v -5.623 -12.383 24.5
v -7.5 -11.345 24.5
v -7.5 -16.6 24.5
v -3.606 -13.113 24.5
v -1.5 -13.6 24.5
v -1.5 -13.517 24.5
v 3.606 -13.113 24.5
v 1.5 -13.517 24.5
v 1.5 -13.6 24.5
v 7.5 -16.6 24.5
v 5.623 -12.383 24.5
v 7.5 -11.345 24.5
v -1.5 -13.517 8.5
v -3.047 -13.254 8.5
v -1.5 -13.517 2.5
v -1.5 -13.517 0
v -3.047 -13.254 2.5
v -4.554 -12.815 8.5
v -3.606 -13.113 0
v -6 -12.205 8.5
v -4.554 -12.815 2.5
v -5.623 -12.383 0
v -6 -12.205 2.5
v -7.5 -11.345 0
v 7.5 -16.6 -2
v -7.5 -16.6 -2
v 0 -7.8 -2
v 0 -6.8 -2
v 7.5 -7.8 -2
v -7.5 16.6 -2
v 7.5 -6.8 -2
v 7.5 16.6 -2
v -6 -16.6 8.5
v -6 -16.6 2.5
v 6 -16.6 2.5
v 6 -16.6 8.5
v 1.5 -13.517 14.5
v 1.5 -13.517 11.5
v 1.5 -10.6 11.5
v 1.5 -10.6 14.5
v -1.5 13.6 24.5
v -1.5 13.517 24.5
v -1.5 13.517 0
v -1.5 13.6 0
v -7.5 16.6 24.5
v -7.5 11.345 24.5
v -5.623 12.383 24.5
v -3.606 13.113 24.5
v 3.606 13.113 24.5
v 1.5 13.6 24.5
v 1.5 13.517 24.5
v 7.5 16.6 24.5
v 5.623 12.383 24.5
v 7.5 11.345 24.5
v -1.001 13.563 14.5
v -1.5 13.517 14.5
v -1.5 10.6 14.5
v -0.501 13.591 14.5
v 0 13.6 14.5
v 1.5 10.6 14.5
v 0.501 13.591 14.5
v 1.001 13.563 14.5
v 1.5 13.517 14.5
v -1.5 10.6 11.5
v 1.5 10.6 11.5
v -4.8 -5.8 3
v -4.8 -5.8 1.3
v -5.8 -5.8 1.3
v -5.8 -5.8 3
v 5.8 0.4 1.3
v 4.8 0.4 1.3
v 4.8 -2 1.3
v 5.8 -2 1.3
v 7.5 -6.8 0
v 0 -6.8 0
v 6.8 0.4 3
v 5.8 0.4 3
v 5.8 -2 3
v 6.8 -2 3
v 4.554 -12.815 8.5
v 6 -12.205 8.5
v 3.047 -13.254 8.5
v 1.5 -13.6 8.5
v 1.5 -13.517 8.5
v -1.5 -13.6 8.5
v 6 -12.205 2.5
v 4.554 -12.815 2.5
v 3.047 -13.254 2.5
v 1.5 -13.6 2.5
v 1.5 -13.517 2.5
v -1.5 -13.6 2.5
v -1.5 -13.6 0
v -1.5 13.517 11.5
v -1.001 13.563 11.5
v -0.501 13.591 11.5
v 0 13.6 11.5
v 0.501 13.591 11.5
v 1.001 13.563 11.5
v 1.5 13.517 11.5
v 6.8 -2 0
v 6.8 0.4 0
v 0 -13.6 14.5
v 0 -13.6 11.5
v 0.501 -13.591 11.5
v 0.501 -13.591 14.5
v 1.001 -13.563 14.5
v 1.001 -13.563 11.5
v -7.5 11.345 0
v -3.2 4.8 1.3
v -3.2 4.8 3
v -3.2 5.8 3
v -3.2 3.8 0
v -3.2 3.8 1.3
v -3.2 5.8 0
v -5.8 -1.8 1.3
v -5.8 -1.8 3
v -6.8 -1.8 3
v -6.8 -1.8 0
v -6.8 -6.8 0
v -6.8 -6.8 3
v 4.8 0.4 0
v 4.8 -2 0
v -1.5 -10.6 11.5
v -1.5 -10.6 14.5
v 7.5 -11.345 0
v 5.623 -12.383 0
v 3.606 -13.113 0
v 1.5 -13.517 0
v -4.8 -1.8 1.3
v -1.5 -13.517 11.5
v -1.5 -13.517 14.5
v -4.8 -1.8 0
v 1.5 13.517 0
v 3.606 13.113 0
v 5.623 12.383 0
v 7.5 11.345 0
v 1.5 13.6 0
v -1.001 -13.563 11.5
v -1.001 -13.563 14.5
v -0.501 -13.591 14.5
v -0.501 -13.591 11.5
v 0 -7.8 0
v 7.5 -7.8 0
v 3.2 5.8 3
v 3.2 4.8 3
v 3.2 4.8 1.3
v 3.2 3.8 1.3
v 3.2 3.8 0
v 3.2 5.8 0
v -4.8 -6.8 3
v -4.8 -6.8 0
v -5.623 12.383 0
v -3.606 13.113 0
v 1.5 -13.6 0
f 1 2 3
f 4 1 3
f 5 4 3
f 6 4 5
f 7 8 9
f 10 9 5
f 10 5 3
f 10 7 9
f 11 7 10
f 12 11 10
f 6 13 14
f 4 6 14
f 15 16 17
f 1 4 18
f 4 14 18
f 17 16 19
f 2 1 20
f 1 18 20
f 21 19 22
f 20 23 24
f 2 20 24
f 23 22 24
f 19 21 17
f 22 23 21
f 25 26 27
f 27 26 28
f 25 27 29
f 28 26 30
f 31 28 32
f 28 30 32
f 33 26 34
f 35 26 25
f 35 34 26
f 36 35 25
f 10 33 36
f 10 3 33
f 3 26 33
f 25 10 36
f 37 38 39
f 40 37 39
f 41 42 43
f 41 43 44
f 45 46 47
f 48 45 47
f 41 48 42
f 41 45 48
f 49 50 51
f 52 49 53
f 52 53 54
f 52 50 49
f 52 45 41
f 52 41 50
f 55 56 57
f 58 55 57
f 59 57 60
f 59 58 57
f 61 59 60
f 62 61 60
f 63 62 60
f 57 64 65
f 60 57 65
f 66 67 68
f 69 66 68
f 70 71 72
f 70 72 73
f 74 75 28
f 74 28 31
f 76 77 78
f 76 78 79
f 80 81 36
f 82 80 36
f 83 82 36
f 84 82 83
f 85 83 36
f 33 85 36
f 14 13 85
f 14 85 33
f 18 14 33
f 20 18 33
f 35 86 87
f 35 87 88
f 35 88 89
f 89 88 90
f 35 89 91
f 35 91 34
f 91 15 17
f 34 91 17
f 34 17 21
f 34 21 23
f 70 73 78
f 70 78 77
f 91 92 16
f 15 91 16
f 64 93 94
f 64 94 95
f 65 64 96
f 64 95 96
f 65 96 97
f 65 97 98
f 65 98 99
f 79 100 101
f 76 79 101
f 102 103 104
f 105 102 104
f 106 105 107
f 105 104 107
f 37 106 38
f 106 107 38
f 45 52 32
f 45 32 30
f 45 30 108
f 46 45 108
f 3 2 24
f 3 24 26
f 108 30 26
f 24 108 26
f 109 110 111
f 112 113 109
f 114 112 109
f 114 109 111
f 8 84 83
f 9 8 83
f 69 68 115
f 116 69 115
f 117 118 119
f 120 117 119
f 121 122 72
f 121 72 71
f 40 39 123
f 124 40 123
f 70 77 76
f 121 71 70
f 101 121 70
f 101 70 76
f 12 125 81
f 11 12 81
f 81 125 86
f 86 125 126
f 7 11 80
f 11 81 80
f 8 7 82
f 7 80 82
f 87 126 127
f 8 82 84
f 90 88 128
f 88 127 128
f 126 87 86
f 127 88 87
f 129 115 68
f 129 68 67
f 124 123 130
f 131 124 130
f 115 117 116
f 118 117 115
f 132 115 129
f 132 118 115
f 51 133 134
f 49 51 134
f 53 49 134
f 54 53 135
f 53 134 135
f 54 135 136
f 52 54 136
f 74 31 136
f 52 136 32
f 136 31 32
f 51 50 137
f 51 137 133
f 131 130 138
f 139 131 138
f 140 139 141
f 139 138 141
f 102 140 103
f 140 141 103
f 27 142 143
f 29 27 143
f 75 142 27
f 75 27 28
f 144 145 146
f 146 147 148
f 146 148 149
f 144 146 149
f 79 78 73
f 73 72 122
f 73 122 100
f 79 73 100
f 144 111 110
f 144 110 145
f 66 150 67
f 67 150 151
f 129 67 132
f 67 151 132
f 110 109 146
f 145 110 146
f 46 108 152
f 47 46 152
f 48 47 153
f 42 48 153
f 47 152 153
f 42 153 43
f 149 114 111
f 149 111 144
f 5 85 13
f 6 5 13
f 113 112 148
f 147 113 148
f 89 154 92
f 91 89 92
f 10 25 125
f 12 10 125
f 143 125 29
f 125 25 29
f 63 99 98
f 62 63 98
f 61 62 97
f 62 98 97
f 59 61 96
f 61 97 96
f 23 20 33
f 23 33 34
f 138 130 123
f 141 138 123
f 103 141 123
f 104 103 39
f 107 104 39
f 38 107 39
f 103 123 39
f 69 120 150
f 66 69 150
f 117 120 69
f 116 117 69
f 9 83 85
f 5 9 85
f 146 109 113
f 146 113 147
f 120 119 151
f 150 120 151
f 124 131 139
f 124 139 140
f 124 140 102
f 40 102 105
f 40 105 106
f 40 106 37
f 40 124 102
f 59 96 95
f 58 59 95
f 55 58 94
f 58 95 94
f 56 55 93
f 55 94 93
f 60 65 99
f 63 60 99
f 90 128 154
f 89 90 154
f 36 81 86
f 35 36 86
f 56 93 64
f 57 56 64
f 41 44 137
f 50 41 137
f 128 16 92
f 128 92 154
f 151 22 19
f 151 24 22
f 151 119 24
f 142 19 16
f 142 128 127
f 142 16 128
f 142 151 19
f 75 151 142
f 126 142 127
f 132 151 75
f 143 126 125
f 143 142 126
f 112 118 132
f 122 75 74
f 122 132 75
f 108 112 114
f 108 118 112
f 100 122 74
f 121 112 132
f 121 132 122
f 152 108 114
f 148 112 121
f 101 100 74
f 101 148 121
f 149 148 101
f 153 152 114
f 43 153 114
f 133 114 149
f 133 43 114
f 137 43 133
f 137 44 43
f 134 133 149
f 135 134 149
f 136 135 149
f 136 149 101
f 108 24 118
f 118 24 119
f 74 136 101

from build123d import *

# Parameters (mm, degrees)
BOSS_EXTRUDE1_DEPTH   = 14.5
BOSS_EXTRUDE1_2_DEPTH = 14.5
BOSS_EXTRUDE1_3_DEPTH = 14.5
BOSS_EXTRUDE1_4_DEPTH = 14.5
SKETCH1_3_W           = 15
SKETCH1_3_H           = 33.2
BOSS_EXTRUDE3_DEPTH   = 2
CUT_EXTRUDE1_DEPTH    = 11.5
BOSS_EXTRUDE4_DEPTH   = 24.5
SKETCH2_W             = 1
SKETCH2_H             = 4
SKETCH2_W_2           = 6.4
SKETCH2_H_2           = 1
SKETCH2_H_3           = 2.4
BOSS_EXTRUDE5_DEPTH   = 1.3
SKETCH2_3_W           = 6.4
SKETCH2_3_H           = 1
SKETCH2_3_W_2         = 1
SKETCH2_3_H_2         = 2.4
BOSS_EXTRUDE6_DEPTH   = 3
SKETCH2_4_W           = 7.5
SKETCH2_4_H           = 1
CUT_EXTRUDE2_DEPTH    = 3
SKETCH3_W             = 12
SKETCH3_H             = 6
CUT_EXTRUDE4_DEPTH    = 5.254957


with BuildPart() as part:
    # Sketch1 → Boss-Extrude1 (new body)
    with BuildSketch(Plane.XY):
        with BuildLine():
            Line((7.5, 16.6), (-7.5, 16.6))
            Line((-7.5, 16.6), (-7.5, 11.34504297))
            ThreePointArc((-7.5, 11.34504297), (-4.629187607, 12.787909215), (-1.5, 13.5170263))
            Line((-1.5, 13.5170263), (-1.5, 13.6))
            Line((-1.5, 13.6), (0, 13.6))
            Line((0, 13.6), (1.5, 13.6))
            Line((1.5, 13.6), (1.5, 13.5170263))
            ThreePointArc((1.5, 13.5170263), (4.629187607, 12.787909215), (7.5, 11.34504297))
            Line((7.5, 11.34504297), (7.5, 16.6))
        make_face()
    extrude(amount=BOSS_EXTRUDE1_DEPTH)



with BuildPart() as body_2:
    # Sketch1 → Boss-Extrude1 2 (new body)
    with BuildSketch(Plane.XY):
        with BuildLine():
            ThreePointArc((0, 13.6), (-0.751146563, 13.579240731), (-1.5, 13.5170263))
            Line((-1.5, 13.5170263), (-1.5, 10.6))
            Line((-1.5, 10.6), (1.5, 10.6))
            Line((1.5, 10.6), (1.5, 13.5170263))
            ThreePointArc((1.5, 13.5170263), (0.751146563, 13.579240731), (0, 13.6))
        make_face()
    extrude(amount=BOSS_EXTRUDE1_2_DEPTH)


with BuildPart() as body_3:
    # Sketch1 → Boss-Extrude1 3 (new body)
    with BuildSketch(Plane.XY):
        with BuildLine():
            Line((-1.5, -10.6), (-1.5, -13.5170263))
            ThreePointArc((-1.5, -13.5170263), (-0.751146563, -13.579240731), (0, -13.6))
            ThreePointArc((0, -13.6), (0.751146563, -13.579240731), (1.5, -13.5170263))
            Line((1.5, -13.5170263), (1.5, -10.6))
            Line((1.5, -10.6), (-1.5, -10.6))
        make_face()
    extrude(amount=BOSS_EXTRUDE1_3_DEPTH)


with BuildPart() as body_4:
    # Sketch1 → Boss-Extrude1 4 (new body)
    with BuildSketch(Plane.XY):
        with BuildLine():
            ThreePointArc((-1.5, -13.5170263), (-4.629187607, -12.787909215), (-7.5, -11.34504297))
            Line((-7.5, -11.34504297), (-7.5, -16.6))
            Line((-7.5, -16.6), (7.5, -16.6))
            Line((7.5, -16.6), (7.5, -11.34504297))
            ThreePointArc((7.5, -11.34504297), (4.629187607, -12.787909215), (1.5, -13.5170263))
            Line((1.5, -13.5170263), (1.5, -13.6))
            Line((1.5, -13.6), (0, -13.6))
            Line((0, -13.6), (-1.5, -13.6))
            Line((-1.5, -13.6), (-1.5, -13.5170263))
        make_face()
    extrude(amount=BOSS_EXTRUDE1_4_DEPTH)


with BuildPart() as part_1:
    add(part.part)

    add(body_4.part)  # Boss-Extrude3 merges body 4
    # Sketch1<3> → Boss-Extrude3 (add)
    with BuildSketch(Plane.XY):
        Rectangle(SKETCH1_3_W, SKETCH1_3_H)
    extrude(amount=-BOSS_EXTRUDE3_DEPTH)

    # Sketch1<5> → Boss-Extrude4 (add)
    with BuildSketch(Plane.XY):
        with BuildLine():
            Line((7.5, 16.6), (-7.5, 16.6))
            Line((-7.5, 16.6), (-7.5, 11.34504297))
            ThreePointArc((-7.5, 11.34504297), (-4.629187607, 12.787909215), (-1.5, 13.5170263))
            Line((-1.5, 13.5170263), (-1.5, 13.6))
            Line((-1.5, 13.6), (0, 13.6))
            Line((0, 13.6), (1.5, 13.6))
            Line((1.5, 13.6), (1.5, 13.5170263))
            ThreePointArc((1.5, 13.5170263), (4.629187607, 12.787909215), (7.5, 11.34504297))
            Line((7.5, 11.34504297), (7.5, 16.6))
        make_face()
        with BuildLine():
            ThreePointArc((-1.5, -13.5170263), (-4.629187607, -12.787909215), (-7.5, -11.34504297))
            Line((-7.5, -11.34504297), (-7.5, -16.6))
            Line((-7.5, -16.6), (7.5, -16.6))
            Line((7.5, -16.6), (7.5, -11.34504297))
            ThreePointArc((7.5, -11.34504297), (4.629187607, -12.787909215), (1.5, -13.5170263))
            Line((1.5, -13.5170263), (1.5, -13.6))
            Line((1.5, -13.6), (0, -13.6))
            Line((0, -13.6), (-1.5, -13.6))
            Line((-1.5, -13.6), (-1.5, -13.5170263))
        make_face()
    extrude(amount=BOSS_EXTRUDE4_DEPTH)

    # Sketch2 → Boss-Extrude5 (add)
    with BuildSketch(Plane.XY):
        with Locations((-5.3, -3.8)):
            Rectangle(SKETCH2_W, SKETCH2_H)
        with Locations((0, 4.3)):
            Rectangle(SKETCH2_W_2, SKETCH2_H_2)
        with Locations((5.3, -0.8)):
            Rectangle(SKETCH2_W, SKETCH2_H_3)
    extrude(amount=BOSS_EXTRUDE5_DEPTH)

    # Sketch2<3> → Boss-Extrude6 (add)
    with BuildSketch(Plane.XY):
        with Locations((0, 5.3)):
            Rectangle(SKETCH2_3_W, SKETCH2_3_H)
        Polygon((-5.8, -1.8), (-6.8, -1.8), (-6.8, -6.8), (-4.8, -6.8), (-4.8, -5.8), (-5.8, -5.8), align=None)
        with Locations((6.3, -0.8)):
            Rectangle(SKETCH2_3_W_2, SKETCH2_3_H_2)
    extrude(amount=BOSS_EXTRUDE6_DEPTH)

    # Sketch2<4> → Cut-Extrude2 (cut, through all)
    with BuildSketch(Plane.XY):
        with Locations((3.75, -7.3)):
            Rectangle(SKETCH2_4_W, SKETCH2_4_H)
    extrude(amount=-CUT_EXTRUDE2_DEPTH, mode=Mode.SUBTRACT)

    # Sketch3 → Cut-Extrude4 (cut)
    with BuildSketch(Plane(origin=(0, -11.34504297, 0), x_dir=(-1, 0, 0), z_dir=(0, -1, 0))):
        with Locations((0, -5.5)):
            Rectangle(SKETCH3_W, SKETCH3_H)
    extrude(amount=CUT_EXTRUDE4_DEPTH, mode=Mode.SUBTRACT)


with BuildPart() as cut_extrude1_tool:
    # Sketch1<4> → Cut-Extrude1 (new body)
    with BuildSketch(Plane.XY):
        with BuildLine():
            Line((-1.5, -10.6), (-1.5, -13.5170263))
            ThreePointArc((-1.5, -13.5170263), (-0.751146563, -13.579240731), (0, -13.6))
            ThreePointArc((0, -13.6), (0.751146563, -13.579240731), (1.5, -13.5170263))
            Line((1.5, -13.5170263), (1.5, -10.6))
            Line((1.5, -10.6), (-1.5, -10.6))
        make_face()
        with BuildLine():
            ThreePointArc((0, 13.6), (-0.751146563, 13.579240731), (-1.5, 13.5170263))
            Line((-1.5, 13.5170263), (-1.5, 10.6))
            Line((-1.5, 10.6), (1.5, 10.6))
            Line((1.5, 10.6), (1.5, 13.5170263))
            ThreePointArc((1.5, 13.5170263), (0.751146563, 13.579240731), (0, 13.6))
        make_face()
    extrude(amount=CUT_EXTRUDE1_DEPTH)


with BuildPart() as body_2_1:
    add(body_2.part)

    # Cut-Extrude1: cut by cut_extrude1_tool
    add(cut_extrude1_tool.part, mode=Mode.SUBTRACT)


with BuildPart() as body_3_1:
    add(body_3.part)

    # Cut-Extrude1: cut by cut_extrude1_tool
    add(cut_extrude1_tool.part, mode=Mode.SUBTRACT)


solid = Compound([part_1.part, body_2_1.part, body_3_1.part])
